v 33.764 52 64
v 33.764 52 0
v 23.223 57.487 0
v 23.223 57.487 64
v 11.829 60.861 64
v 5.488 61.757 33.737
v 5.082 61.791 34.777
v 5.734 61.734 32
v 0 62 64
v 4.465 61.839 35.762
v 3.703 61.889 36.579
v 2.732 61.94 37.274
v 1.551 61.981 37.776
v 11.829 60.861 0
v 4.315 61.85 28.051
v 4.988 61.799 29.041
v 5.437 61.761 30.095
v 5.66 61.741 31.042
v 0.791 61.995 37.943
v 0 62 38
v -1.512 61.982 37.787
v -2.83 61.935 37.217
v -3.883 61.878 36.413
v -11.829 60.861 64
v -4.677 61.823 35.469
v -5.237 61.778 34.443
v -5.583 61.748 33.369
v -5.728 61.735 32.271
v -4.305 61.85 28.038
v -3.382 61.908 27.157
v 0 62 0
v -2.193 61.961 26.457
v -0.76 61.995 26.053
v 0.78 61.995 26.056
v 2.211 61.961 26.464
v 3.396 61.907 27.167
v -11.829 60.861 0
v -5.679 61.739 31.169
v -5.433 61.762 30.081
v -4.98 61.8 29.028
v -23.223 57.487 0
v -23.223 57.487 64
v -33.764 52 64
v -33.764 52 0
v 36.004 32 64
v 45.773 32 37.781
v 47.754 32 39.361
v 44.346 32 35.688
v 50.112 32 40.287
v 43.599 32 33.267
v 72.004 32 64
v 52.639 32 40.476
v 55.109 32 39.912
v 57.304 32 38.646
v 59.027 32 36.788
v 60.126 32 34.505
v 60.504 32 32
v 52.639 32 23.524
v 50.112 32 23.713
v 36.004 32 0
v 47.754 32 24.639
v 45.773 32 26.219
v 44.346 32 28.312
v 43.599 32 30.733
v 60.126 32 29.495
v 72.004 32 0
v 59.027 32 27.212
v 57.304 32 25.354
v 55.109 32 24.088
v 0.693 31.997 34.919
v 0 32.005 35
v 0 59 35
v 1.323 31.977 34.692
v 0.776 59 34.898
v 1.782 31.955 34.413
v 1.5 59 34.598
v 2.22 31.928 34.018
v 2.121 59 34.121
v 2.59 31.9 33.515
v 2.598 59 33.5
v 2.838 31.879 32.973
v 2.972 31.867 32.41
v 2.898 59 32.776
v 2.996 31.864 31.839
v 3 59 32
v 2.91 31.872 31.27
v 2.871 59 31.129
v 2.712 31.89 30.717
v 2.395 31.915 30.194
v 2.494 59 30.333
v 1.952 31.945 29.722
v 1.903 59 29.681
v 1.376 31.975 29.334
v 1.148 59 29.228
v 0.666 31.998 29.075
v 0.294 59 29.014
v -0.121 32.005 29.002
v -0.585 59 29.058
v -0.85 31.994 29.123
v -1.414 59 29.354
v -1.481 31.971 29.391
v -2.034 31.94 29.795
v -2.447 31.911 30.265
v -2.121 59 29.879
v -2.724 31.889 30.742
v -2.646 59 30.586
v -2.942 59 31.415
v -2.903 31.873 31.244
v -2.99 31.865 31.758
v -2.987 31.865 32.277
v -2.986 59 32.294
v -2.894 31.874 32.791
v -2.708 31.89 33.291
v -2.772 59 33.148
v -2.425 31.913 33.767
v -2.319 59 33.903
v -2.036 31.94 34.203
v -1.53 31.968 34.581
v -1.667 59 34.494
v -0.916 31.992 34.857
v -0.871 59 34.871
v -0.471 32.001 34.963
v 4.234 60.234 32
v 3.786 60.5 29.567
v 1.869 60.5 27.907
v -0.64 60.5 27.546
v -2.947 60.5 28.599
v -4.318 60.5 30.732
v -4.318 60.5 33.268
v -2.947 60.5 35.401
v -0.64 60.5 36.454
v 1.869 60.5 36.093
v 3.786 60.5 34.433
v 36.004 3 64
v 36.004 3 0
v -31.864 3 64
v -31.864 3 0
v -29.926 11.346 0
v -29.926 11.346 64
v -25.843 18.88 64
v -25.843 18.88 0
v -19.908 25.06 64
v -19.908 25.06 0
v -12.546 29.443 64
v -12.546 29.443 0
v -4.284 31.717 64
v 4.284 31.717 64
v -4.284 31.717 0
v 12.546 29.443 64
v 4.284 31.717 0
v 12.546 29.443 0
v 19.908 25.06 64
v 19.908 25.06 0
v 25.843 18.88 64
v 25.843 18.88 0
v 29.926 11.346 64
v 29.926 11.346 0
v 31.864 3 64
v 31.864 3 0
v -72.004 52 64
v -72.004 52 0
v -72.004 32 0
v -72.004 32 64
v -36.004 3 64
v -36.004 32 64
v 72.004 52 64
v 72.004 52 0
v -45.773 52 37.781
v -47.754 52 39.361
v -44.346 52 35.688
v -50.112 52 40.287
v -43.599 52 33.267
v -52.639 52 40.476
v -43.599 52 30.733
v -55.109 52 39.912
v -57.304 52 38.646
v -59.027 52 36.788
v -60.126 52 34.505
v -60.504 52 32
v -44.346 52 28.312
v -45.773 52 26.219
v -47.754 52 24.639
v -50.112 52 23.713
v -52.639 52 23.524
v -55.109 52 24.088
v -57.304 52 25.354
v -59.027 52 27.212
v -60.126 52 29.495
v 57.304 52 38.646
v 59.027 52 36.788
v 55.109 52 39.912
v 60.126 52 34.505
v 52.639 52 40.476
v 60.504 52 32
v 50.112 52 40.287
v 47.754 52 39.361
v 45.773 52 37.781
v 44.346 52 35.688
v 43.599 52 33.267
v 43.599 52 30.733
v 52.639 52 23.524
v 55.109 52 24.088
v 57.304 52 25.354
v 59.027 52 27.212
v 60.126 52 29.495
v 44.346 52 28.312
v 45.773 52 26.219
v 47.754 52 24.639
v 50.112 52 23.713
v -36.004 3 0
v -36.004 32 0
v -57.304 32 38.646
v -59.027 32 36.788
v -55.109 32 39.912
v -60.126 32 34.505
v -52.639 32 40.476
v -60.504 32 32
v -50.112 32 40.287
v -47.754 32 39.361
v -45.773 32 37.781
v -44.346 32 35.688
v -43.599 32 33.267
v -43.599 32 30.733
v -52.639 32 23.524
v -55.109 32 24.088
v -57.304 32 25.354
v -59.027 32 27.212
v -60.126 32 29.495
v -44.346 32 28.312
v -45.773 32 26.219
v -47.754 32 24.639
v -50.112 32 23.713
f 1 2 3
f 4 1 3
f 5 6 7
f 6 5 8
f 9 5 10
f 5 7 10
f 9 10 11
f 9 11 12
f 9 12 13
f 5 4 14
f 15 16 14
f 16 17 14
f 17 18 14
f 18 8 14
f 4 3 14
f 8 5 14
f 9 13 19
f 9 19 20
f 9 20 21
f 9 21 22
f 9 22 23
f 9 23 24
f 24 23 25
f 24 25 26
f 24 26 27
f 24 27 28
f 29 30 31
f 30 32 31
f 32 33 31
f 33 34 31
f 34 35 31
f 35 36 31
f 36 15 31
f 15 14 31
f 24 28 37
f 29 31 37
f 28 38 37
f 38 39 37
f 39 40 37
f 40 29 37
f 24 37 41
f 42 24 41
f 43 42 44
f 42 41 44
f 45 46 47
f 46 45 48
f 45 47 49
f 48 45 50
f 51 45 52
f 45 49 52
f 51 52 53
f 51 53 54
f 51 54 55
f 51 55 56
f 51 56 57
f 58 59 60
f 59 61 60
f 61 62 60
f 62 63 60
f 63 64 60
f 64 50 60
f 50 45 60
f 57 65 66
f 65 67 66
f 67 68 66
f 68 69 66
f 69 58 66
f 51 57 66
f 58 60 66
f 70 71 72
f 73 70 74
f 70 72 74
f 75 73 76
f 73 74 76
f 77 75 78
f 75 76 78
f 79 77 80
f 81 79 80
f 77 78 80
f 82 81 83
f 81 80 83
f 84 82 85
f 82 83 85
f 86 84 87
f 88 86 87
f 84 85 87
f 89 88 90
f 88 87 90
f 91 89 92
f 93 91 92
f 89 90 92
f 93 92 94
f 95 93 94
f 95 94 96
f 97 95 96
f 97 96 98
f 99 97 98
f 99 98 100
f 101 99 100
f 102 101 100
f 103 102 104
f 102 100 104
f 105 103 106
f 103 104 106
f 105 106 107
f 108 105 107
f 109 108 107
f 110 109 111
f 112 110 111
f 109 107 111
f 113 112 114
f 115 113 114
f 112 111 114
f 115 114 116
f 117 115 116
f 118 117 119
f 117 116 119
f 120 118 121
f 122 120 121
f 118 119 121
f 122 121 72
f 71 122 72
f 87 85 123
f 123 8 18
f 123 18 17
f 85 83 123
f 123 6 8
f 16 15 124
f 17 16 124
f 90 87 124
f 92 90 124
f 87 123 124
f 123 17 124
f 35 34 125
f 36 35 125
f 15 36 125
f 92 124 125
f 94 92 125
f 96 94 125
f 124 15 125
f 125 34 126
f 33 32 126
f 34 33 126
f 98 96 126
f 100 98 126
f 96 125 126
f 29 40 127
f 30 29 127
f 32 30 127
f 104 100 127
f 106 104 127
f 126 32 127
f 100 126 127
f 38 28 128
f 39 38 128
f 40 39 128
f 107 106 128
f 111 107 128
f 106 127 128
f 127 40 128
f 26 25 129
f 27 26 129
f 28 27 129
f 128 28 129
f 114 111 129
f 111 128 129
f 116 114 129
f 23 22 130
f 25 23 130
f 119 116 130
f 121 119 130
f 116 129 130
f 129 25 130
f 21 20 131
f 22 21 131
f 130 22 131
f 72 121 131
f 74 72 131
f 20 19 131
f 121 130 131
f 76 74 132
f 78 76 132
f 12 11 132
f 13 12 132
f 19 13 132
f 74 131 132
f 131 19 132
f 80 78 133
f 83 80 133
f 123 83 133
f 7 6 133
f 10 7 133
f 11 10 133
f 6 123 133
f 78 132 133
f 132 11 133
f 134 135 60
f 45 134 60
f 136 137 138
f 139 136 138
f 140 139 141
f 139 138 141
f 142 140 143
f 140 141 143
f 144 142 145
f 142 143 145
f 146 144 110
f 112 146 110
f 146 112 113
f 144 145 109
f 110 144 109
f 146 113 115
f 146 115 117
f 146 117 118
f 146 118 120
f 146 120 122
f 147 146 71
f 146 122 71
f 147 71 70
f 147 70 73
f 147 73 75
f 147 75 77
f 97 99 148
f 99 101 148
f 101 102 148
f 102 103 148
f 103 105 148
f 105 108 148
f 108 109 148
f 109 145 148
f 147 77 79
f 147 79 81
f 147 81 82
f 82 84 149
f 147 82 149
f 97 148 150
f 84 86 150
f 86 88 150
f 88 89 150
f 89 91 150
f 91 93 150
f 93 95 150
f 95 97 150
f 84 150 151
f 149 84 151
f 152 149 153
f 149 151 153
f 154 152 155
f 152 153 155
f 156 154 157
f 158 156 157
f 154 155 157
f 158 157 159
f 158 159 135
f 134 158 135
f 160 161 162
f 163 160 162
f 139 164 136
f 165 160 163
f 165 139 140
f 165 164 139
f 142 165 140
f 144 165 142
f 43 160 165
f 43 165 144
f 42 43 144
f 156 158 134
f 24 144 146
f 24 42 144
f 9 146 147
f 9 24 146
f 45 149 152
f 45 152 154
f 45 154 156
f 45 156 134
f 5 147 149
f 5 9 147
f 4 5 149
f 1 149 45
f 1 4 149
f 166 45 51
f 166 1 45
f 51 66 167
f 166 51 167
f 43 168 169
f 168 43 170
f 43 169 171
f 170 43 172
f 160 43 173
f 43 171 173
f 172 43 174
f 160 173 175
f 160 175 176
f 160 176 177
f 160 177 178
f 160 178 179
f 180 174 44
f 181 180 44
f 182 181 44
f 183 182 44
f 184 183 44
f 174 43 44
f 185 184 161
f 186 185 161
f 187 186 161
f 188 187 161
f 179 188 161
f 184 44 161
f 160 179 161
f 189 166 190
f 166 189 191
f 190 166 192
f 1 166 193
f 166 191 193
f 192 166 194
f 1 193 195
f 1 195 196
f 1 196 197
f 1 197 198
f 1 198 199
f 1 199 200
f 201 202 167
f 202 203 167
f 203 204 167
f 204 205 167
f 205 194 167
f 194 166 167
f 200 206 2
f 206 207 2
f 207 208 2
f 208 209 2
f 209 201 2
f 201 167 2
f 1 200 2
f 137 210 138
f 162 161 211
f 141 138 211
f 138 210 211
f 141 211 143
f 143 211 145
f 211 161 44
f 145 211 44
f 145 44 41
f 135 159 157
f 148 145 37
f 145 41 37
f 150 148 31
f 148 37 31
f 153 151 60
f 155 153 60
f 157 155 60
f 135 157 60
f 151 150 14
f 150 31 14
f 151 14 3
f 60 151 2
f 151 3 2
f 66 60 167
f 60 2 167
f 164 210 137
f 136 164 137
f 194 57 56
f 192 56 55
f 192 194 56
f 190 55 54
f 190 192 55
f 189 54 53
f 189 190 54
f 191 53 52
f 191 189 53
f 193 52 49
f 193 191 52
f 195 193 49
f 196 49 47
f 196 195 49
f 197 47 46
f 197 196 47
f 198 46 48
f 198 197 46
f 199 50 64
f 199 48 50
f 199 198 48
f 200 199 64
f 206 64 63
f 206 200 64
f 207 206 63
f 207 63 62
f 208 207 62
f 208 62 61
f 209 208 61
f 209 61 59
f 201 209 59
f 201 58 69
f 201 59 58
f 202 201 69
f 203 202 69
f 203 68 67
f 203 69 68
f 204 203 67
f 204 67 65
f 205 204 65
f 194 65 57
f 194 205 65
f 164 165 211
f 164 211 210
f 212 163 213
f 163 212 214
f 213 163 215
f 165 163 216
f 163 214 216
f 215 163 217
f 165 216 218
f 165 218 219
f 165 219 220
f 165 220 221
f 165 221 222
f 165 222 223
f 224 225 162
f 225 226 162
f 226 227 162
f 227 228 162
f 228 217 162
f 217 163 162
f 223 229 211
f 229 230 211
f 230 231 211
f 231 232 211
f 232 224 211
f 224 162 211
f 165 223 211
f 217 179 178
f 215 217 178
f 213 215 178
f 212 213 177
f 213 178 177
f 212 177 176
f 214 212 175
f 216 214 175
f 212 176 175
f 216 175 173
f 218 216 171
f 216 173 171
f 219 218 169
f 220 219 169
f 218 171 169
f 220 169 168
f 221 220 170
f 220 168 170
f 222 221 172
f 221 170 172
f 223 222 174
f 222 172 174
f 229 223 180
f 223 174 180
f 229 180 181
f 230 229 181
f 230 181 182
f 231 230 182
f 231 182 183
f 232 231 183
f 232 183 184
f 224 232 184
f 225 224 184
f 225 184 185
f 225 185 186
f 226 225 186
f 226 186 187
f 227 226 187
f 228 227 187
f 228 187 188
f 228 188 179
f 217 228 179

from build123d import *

# Parameters (mm, degrees)
BOSS_EXTRUDE1_DEPTH = 64
SKETCH2_R           = 8.5
CUT_EXTRUDE1_DEPTH  = 109.081263889
SKETCH3_R           = 3
CUT_EXTRUDE2_DEPTH  = 113.967073095
SKETCH4_R           = 6
CUT_EXTRUDE3_DEPTH  = 3
CUT_EXTRUDE3_DRAFT  = -45


with BuildPart() as part:
    # Sketch1 → Boss-Extrude1 (new body)
    with BuildSketch(Plane.XY):
        with BuildLine():
            Line((-33.763886032, 52), (-72.003886032, 52))
            Line((-72.003886032, 52), (-72.003886032, 32))
            Line((-72.003886032, 32), (-36.003886032, 32))
            Line((-36.003886032, 32), (-36.003886032, 3))
            Line((-36.003886032, 3), (-31.863886032, 3))
            ThreePointArc((-31.863886032, 3), (0, 32.004800157), (31.863886032, 3))
            Line((31.863886032, 3), (36.003886032, 3))
            Line((36.003886032, 3), (36.003886032, 32))
            Line((36.003886032, 32), (72.003886032, 32))
            Line((72.003886032, 32), (72.003886032, 52))
            Line((72.003886032, 52), (33.763886032, 52))
            ThreePointArc((33.763886032, 52), (0, 62), (-33.763886032, 52))
        make_face()
    extrude(amount=BOSS_EXTRUDE1_DEPTH)

    # Sketch2 → Cut-Extrude1 (cut, through all)
    with BuildSketch(Plane(origin=(0, 52, 0), x_dir=(1, 0, 0), z_dir=(0, 1, 0))):
        with Locations(Location((-52.003886032, -32, 0), (0, 0, 180))):
            Circle(SKETCH2_R)
    cut_extrude1 = extrude(amount=-CUT_EXTRUDE1_DEPTH, mode=Mode.SUBTRACT)

    # Mirror1: Cut-Extrude1 across plane
    add(cut_extrude1.mirror(Plane(origin=(0, 0, 0), x_dir=(0, 0, 1), z_dir=(1, 0, 0))), mode=Mode.SUBTRACT)

    # Sketch3 → Cut-Extrude2 (cut, through all)
    with BuildSketch(Plane(origin=(0, 62, 0), x_dir=(1, 0, 0), z_dir=(0, 1, 0))):
        with Locations(Location((0, -32, 0), (0, 0, 270))):
            Circle(SKETCH3_R)
    extrude(amount=-CUT_EXTRUDE2_DEPTH, mode=Mode.SUBTRACT)


with BuildPart() as cut_extrude3_tool:
    # Sketch4 → Cut-Extrude3 (with draft: the straight prism first)
    with BuildSketch(Plane(origin=(0, 62, 0), x_dir=(1, 0, 0), z_dir=(0, 1, 0))):
        with Locations((0, -32)):
            Circle(SKETCH4_R)
    extrude(amount=-CUT_EXTRUDE3_DEPTH)
    # Cut-Extrude3: the draft: its side faces are tilted about the plane it starts from
    cut_extrude3_sides = [cut_extrude3_tool.faces().sort_by_distance(p)[0] for p in [
        (-6, 60.5, 32),
    ]]
    draft(cut_extrude3_sides, Plane(origin=(0, 62, 0), x_dir=(1, 0, 0), z_dir=(0, 1, 0)), CUT_EXTRUDE3_DRAFT)


with BuildPart() as part_1:
    add(part.part)

    # Cut-Extrude3: cut by cut_extrude3_tool
    add(cut_extrude3_tool.part, mode=Mode.SUBTRACT)


solid = part_1.part
